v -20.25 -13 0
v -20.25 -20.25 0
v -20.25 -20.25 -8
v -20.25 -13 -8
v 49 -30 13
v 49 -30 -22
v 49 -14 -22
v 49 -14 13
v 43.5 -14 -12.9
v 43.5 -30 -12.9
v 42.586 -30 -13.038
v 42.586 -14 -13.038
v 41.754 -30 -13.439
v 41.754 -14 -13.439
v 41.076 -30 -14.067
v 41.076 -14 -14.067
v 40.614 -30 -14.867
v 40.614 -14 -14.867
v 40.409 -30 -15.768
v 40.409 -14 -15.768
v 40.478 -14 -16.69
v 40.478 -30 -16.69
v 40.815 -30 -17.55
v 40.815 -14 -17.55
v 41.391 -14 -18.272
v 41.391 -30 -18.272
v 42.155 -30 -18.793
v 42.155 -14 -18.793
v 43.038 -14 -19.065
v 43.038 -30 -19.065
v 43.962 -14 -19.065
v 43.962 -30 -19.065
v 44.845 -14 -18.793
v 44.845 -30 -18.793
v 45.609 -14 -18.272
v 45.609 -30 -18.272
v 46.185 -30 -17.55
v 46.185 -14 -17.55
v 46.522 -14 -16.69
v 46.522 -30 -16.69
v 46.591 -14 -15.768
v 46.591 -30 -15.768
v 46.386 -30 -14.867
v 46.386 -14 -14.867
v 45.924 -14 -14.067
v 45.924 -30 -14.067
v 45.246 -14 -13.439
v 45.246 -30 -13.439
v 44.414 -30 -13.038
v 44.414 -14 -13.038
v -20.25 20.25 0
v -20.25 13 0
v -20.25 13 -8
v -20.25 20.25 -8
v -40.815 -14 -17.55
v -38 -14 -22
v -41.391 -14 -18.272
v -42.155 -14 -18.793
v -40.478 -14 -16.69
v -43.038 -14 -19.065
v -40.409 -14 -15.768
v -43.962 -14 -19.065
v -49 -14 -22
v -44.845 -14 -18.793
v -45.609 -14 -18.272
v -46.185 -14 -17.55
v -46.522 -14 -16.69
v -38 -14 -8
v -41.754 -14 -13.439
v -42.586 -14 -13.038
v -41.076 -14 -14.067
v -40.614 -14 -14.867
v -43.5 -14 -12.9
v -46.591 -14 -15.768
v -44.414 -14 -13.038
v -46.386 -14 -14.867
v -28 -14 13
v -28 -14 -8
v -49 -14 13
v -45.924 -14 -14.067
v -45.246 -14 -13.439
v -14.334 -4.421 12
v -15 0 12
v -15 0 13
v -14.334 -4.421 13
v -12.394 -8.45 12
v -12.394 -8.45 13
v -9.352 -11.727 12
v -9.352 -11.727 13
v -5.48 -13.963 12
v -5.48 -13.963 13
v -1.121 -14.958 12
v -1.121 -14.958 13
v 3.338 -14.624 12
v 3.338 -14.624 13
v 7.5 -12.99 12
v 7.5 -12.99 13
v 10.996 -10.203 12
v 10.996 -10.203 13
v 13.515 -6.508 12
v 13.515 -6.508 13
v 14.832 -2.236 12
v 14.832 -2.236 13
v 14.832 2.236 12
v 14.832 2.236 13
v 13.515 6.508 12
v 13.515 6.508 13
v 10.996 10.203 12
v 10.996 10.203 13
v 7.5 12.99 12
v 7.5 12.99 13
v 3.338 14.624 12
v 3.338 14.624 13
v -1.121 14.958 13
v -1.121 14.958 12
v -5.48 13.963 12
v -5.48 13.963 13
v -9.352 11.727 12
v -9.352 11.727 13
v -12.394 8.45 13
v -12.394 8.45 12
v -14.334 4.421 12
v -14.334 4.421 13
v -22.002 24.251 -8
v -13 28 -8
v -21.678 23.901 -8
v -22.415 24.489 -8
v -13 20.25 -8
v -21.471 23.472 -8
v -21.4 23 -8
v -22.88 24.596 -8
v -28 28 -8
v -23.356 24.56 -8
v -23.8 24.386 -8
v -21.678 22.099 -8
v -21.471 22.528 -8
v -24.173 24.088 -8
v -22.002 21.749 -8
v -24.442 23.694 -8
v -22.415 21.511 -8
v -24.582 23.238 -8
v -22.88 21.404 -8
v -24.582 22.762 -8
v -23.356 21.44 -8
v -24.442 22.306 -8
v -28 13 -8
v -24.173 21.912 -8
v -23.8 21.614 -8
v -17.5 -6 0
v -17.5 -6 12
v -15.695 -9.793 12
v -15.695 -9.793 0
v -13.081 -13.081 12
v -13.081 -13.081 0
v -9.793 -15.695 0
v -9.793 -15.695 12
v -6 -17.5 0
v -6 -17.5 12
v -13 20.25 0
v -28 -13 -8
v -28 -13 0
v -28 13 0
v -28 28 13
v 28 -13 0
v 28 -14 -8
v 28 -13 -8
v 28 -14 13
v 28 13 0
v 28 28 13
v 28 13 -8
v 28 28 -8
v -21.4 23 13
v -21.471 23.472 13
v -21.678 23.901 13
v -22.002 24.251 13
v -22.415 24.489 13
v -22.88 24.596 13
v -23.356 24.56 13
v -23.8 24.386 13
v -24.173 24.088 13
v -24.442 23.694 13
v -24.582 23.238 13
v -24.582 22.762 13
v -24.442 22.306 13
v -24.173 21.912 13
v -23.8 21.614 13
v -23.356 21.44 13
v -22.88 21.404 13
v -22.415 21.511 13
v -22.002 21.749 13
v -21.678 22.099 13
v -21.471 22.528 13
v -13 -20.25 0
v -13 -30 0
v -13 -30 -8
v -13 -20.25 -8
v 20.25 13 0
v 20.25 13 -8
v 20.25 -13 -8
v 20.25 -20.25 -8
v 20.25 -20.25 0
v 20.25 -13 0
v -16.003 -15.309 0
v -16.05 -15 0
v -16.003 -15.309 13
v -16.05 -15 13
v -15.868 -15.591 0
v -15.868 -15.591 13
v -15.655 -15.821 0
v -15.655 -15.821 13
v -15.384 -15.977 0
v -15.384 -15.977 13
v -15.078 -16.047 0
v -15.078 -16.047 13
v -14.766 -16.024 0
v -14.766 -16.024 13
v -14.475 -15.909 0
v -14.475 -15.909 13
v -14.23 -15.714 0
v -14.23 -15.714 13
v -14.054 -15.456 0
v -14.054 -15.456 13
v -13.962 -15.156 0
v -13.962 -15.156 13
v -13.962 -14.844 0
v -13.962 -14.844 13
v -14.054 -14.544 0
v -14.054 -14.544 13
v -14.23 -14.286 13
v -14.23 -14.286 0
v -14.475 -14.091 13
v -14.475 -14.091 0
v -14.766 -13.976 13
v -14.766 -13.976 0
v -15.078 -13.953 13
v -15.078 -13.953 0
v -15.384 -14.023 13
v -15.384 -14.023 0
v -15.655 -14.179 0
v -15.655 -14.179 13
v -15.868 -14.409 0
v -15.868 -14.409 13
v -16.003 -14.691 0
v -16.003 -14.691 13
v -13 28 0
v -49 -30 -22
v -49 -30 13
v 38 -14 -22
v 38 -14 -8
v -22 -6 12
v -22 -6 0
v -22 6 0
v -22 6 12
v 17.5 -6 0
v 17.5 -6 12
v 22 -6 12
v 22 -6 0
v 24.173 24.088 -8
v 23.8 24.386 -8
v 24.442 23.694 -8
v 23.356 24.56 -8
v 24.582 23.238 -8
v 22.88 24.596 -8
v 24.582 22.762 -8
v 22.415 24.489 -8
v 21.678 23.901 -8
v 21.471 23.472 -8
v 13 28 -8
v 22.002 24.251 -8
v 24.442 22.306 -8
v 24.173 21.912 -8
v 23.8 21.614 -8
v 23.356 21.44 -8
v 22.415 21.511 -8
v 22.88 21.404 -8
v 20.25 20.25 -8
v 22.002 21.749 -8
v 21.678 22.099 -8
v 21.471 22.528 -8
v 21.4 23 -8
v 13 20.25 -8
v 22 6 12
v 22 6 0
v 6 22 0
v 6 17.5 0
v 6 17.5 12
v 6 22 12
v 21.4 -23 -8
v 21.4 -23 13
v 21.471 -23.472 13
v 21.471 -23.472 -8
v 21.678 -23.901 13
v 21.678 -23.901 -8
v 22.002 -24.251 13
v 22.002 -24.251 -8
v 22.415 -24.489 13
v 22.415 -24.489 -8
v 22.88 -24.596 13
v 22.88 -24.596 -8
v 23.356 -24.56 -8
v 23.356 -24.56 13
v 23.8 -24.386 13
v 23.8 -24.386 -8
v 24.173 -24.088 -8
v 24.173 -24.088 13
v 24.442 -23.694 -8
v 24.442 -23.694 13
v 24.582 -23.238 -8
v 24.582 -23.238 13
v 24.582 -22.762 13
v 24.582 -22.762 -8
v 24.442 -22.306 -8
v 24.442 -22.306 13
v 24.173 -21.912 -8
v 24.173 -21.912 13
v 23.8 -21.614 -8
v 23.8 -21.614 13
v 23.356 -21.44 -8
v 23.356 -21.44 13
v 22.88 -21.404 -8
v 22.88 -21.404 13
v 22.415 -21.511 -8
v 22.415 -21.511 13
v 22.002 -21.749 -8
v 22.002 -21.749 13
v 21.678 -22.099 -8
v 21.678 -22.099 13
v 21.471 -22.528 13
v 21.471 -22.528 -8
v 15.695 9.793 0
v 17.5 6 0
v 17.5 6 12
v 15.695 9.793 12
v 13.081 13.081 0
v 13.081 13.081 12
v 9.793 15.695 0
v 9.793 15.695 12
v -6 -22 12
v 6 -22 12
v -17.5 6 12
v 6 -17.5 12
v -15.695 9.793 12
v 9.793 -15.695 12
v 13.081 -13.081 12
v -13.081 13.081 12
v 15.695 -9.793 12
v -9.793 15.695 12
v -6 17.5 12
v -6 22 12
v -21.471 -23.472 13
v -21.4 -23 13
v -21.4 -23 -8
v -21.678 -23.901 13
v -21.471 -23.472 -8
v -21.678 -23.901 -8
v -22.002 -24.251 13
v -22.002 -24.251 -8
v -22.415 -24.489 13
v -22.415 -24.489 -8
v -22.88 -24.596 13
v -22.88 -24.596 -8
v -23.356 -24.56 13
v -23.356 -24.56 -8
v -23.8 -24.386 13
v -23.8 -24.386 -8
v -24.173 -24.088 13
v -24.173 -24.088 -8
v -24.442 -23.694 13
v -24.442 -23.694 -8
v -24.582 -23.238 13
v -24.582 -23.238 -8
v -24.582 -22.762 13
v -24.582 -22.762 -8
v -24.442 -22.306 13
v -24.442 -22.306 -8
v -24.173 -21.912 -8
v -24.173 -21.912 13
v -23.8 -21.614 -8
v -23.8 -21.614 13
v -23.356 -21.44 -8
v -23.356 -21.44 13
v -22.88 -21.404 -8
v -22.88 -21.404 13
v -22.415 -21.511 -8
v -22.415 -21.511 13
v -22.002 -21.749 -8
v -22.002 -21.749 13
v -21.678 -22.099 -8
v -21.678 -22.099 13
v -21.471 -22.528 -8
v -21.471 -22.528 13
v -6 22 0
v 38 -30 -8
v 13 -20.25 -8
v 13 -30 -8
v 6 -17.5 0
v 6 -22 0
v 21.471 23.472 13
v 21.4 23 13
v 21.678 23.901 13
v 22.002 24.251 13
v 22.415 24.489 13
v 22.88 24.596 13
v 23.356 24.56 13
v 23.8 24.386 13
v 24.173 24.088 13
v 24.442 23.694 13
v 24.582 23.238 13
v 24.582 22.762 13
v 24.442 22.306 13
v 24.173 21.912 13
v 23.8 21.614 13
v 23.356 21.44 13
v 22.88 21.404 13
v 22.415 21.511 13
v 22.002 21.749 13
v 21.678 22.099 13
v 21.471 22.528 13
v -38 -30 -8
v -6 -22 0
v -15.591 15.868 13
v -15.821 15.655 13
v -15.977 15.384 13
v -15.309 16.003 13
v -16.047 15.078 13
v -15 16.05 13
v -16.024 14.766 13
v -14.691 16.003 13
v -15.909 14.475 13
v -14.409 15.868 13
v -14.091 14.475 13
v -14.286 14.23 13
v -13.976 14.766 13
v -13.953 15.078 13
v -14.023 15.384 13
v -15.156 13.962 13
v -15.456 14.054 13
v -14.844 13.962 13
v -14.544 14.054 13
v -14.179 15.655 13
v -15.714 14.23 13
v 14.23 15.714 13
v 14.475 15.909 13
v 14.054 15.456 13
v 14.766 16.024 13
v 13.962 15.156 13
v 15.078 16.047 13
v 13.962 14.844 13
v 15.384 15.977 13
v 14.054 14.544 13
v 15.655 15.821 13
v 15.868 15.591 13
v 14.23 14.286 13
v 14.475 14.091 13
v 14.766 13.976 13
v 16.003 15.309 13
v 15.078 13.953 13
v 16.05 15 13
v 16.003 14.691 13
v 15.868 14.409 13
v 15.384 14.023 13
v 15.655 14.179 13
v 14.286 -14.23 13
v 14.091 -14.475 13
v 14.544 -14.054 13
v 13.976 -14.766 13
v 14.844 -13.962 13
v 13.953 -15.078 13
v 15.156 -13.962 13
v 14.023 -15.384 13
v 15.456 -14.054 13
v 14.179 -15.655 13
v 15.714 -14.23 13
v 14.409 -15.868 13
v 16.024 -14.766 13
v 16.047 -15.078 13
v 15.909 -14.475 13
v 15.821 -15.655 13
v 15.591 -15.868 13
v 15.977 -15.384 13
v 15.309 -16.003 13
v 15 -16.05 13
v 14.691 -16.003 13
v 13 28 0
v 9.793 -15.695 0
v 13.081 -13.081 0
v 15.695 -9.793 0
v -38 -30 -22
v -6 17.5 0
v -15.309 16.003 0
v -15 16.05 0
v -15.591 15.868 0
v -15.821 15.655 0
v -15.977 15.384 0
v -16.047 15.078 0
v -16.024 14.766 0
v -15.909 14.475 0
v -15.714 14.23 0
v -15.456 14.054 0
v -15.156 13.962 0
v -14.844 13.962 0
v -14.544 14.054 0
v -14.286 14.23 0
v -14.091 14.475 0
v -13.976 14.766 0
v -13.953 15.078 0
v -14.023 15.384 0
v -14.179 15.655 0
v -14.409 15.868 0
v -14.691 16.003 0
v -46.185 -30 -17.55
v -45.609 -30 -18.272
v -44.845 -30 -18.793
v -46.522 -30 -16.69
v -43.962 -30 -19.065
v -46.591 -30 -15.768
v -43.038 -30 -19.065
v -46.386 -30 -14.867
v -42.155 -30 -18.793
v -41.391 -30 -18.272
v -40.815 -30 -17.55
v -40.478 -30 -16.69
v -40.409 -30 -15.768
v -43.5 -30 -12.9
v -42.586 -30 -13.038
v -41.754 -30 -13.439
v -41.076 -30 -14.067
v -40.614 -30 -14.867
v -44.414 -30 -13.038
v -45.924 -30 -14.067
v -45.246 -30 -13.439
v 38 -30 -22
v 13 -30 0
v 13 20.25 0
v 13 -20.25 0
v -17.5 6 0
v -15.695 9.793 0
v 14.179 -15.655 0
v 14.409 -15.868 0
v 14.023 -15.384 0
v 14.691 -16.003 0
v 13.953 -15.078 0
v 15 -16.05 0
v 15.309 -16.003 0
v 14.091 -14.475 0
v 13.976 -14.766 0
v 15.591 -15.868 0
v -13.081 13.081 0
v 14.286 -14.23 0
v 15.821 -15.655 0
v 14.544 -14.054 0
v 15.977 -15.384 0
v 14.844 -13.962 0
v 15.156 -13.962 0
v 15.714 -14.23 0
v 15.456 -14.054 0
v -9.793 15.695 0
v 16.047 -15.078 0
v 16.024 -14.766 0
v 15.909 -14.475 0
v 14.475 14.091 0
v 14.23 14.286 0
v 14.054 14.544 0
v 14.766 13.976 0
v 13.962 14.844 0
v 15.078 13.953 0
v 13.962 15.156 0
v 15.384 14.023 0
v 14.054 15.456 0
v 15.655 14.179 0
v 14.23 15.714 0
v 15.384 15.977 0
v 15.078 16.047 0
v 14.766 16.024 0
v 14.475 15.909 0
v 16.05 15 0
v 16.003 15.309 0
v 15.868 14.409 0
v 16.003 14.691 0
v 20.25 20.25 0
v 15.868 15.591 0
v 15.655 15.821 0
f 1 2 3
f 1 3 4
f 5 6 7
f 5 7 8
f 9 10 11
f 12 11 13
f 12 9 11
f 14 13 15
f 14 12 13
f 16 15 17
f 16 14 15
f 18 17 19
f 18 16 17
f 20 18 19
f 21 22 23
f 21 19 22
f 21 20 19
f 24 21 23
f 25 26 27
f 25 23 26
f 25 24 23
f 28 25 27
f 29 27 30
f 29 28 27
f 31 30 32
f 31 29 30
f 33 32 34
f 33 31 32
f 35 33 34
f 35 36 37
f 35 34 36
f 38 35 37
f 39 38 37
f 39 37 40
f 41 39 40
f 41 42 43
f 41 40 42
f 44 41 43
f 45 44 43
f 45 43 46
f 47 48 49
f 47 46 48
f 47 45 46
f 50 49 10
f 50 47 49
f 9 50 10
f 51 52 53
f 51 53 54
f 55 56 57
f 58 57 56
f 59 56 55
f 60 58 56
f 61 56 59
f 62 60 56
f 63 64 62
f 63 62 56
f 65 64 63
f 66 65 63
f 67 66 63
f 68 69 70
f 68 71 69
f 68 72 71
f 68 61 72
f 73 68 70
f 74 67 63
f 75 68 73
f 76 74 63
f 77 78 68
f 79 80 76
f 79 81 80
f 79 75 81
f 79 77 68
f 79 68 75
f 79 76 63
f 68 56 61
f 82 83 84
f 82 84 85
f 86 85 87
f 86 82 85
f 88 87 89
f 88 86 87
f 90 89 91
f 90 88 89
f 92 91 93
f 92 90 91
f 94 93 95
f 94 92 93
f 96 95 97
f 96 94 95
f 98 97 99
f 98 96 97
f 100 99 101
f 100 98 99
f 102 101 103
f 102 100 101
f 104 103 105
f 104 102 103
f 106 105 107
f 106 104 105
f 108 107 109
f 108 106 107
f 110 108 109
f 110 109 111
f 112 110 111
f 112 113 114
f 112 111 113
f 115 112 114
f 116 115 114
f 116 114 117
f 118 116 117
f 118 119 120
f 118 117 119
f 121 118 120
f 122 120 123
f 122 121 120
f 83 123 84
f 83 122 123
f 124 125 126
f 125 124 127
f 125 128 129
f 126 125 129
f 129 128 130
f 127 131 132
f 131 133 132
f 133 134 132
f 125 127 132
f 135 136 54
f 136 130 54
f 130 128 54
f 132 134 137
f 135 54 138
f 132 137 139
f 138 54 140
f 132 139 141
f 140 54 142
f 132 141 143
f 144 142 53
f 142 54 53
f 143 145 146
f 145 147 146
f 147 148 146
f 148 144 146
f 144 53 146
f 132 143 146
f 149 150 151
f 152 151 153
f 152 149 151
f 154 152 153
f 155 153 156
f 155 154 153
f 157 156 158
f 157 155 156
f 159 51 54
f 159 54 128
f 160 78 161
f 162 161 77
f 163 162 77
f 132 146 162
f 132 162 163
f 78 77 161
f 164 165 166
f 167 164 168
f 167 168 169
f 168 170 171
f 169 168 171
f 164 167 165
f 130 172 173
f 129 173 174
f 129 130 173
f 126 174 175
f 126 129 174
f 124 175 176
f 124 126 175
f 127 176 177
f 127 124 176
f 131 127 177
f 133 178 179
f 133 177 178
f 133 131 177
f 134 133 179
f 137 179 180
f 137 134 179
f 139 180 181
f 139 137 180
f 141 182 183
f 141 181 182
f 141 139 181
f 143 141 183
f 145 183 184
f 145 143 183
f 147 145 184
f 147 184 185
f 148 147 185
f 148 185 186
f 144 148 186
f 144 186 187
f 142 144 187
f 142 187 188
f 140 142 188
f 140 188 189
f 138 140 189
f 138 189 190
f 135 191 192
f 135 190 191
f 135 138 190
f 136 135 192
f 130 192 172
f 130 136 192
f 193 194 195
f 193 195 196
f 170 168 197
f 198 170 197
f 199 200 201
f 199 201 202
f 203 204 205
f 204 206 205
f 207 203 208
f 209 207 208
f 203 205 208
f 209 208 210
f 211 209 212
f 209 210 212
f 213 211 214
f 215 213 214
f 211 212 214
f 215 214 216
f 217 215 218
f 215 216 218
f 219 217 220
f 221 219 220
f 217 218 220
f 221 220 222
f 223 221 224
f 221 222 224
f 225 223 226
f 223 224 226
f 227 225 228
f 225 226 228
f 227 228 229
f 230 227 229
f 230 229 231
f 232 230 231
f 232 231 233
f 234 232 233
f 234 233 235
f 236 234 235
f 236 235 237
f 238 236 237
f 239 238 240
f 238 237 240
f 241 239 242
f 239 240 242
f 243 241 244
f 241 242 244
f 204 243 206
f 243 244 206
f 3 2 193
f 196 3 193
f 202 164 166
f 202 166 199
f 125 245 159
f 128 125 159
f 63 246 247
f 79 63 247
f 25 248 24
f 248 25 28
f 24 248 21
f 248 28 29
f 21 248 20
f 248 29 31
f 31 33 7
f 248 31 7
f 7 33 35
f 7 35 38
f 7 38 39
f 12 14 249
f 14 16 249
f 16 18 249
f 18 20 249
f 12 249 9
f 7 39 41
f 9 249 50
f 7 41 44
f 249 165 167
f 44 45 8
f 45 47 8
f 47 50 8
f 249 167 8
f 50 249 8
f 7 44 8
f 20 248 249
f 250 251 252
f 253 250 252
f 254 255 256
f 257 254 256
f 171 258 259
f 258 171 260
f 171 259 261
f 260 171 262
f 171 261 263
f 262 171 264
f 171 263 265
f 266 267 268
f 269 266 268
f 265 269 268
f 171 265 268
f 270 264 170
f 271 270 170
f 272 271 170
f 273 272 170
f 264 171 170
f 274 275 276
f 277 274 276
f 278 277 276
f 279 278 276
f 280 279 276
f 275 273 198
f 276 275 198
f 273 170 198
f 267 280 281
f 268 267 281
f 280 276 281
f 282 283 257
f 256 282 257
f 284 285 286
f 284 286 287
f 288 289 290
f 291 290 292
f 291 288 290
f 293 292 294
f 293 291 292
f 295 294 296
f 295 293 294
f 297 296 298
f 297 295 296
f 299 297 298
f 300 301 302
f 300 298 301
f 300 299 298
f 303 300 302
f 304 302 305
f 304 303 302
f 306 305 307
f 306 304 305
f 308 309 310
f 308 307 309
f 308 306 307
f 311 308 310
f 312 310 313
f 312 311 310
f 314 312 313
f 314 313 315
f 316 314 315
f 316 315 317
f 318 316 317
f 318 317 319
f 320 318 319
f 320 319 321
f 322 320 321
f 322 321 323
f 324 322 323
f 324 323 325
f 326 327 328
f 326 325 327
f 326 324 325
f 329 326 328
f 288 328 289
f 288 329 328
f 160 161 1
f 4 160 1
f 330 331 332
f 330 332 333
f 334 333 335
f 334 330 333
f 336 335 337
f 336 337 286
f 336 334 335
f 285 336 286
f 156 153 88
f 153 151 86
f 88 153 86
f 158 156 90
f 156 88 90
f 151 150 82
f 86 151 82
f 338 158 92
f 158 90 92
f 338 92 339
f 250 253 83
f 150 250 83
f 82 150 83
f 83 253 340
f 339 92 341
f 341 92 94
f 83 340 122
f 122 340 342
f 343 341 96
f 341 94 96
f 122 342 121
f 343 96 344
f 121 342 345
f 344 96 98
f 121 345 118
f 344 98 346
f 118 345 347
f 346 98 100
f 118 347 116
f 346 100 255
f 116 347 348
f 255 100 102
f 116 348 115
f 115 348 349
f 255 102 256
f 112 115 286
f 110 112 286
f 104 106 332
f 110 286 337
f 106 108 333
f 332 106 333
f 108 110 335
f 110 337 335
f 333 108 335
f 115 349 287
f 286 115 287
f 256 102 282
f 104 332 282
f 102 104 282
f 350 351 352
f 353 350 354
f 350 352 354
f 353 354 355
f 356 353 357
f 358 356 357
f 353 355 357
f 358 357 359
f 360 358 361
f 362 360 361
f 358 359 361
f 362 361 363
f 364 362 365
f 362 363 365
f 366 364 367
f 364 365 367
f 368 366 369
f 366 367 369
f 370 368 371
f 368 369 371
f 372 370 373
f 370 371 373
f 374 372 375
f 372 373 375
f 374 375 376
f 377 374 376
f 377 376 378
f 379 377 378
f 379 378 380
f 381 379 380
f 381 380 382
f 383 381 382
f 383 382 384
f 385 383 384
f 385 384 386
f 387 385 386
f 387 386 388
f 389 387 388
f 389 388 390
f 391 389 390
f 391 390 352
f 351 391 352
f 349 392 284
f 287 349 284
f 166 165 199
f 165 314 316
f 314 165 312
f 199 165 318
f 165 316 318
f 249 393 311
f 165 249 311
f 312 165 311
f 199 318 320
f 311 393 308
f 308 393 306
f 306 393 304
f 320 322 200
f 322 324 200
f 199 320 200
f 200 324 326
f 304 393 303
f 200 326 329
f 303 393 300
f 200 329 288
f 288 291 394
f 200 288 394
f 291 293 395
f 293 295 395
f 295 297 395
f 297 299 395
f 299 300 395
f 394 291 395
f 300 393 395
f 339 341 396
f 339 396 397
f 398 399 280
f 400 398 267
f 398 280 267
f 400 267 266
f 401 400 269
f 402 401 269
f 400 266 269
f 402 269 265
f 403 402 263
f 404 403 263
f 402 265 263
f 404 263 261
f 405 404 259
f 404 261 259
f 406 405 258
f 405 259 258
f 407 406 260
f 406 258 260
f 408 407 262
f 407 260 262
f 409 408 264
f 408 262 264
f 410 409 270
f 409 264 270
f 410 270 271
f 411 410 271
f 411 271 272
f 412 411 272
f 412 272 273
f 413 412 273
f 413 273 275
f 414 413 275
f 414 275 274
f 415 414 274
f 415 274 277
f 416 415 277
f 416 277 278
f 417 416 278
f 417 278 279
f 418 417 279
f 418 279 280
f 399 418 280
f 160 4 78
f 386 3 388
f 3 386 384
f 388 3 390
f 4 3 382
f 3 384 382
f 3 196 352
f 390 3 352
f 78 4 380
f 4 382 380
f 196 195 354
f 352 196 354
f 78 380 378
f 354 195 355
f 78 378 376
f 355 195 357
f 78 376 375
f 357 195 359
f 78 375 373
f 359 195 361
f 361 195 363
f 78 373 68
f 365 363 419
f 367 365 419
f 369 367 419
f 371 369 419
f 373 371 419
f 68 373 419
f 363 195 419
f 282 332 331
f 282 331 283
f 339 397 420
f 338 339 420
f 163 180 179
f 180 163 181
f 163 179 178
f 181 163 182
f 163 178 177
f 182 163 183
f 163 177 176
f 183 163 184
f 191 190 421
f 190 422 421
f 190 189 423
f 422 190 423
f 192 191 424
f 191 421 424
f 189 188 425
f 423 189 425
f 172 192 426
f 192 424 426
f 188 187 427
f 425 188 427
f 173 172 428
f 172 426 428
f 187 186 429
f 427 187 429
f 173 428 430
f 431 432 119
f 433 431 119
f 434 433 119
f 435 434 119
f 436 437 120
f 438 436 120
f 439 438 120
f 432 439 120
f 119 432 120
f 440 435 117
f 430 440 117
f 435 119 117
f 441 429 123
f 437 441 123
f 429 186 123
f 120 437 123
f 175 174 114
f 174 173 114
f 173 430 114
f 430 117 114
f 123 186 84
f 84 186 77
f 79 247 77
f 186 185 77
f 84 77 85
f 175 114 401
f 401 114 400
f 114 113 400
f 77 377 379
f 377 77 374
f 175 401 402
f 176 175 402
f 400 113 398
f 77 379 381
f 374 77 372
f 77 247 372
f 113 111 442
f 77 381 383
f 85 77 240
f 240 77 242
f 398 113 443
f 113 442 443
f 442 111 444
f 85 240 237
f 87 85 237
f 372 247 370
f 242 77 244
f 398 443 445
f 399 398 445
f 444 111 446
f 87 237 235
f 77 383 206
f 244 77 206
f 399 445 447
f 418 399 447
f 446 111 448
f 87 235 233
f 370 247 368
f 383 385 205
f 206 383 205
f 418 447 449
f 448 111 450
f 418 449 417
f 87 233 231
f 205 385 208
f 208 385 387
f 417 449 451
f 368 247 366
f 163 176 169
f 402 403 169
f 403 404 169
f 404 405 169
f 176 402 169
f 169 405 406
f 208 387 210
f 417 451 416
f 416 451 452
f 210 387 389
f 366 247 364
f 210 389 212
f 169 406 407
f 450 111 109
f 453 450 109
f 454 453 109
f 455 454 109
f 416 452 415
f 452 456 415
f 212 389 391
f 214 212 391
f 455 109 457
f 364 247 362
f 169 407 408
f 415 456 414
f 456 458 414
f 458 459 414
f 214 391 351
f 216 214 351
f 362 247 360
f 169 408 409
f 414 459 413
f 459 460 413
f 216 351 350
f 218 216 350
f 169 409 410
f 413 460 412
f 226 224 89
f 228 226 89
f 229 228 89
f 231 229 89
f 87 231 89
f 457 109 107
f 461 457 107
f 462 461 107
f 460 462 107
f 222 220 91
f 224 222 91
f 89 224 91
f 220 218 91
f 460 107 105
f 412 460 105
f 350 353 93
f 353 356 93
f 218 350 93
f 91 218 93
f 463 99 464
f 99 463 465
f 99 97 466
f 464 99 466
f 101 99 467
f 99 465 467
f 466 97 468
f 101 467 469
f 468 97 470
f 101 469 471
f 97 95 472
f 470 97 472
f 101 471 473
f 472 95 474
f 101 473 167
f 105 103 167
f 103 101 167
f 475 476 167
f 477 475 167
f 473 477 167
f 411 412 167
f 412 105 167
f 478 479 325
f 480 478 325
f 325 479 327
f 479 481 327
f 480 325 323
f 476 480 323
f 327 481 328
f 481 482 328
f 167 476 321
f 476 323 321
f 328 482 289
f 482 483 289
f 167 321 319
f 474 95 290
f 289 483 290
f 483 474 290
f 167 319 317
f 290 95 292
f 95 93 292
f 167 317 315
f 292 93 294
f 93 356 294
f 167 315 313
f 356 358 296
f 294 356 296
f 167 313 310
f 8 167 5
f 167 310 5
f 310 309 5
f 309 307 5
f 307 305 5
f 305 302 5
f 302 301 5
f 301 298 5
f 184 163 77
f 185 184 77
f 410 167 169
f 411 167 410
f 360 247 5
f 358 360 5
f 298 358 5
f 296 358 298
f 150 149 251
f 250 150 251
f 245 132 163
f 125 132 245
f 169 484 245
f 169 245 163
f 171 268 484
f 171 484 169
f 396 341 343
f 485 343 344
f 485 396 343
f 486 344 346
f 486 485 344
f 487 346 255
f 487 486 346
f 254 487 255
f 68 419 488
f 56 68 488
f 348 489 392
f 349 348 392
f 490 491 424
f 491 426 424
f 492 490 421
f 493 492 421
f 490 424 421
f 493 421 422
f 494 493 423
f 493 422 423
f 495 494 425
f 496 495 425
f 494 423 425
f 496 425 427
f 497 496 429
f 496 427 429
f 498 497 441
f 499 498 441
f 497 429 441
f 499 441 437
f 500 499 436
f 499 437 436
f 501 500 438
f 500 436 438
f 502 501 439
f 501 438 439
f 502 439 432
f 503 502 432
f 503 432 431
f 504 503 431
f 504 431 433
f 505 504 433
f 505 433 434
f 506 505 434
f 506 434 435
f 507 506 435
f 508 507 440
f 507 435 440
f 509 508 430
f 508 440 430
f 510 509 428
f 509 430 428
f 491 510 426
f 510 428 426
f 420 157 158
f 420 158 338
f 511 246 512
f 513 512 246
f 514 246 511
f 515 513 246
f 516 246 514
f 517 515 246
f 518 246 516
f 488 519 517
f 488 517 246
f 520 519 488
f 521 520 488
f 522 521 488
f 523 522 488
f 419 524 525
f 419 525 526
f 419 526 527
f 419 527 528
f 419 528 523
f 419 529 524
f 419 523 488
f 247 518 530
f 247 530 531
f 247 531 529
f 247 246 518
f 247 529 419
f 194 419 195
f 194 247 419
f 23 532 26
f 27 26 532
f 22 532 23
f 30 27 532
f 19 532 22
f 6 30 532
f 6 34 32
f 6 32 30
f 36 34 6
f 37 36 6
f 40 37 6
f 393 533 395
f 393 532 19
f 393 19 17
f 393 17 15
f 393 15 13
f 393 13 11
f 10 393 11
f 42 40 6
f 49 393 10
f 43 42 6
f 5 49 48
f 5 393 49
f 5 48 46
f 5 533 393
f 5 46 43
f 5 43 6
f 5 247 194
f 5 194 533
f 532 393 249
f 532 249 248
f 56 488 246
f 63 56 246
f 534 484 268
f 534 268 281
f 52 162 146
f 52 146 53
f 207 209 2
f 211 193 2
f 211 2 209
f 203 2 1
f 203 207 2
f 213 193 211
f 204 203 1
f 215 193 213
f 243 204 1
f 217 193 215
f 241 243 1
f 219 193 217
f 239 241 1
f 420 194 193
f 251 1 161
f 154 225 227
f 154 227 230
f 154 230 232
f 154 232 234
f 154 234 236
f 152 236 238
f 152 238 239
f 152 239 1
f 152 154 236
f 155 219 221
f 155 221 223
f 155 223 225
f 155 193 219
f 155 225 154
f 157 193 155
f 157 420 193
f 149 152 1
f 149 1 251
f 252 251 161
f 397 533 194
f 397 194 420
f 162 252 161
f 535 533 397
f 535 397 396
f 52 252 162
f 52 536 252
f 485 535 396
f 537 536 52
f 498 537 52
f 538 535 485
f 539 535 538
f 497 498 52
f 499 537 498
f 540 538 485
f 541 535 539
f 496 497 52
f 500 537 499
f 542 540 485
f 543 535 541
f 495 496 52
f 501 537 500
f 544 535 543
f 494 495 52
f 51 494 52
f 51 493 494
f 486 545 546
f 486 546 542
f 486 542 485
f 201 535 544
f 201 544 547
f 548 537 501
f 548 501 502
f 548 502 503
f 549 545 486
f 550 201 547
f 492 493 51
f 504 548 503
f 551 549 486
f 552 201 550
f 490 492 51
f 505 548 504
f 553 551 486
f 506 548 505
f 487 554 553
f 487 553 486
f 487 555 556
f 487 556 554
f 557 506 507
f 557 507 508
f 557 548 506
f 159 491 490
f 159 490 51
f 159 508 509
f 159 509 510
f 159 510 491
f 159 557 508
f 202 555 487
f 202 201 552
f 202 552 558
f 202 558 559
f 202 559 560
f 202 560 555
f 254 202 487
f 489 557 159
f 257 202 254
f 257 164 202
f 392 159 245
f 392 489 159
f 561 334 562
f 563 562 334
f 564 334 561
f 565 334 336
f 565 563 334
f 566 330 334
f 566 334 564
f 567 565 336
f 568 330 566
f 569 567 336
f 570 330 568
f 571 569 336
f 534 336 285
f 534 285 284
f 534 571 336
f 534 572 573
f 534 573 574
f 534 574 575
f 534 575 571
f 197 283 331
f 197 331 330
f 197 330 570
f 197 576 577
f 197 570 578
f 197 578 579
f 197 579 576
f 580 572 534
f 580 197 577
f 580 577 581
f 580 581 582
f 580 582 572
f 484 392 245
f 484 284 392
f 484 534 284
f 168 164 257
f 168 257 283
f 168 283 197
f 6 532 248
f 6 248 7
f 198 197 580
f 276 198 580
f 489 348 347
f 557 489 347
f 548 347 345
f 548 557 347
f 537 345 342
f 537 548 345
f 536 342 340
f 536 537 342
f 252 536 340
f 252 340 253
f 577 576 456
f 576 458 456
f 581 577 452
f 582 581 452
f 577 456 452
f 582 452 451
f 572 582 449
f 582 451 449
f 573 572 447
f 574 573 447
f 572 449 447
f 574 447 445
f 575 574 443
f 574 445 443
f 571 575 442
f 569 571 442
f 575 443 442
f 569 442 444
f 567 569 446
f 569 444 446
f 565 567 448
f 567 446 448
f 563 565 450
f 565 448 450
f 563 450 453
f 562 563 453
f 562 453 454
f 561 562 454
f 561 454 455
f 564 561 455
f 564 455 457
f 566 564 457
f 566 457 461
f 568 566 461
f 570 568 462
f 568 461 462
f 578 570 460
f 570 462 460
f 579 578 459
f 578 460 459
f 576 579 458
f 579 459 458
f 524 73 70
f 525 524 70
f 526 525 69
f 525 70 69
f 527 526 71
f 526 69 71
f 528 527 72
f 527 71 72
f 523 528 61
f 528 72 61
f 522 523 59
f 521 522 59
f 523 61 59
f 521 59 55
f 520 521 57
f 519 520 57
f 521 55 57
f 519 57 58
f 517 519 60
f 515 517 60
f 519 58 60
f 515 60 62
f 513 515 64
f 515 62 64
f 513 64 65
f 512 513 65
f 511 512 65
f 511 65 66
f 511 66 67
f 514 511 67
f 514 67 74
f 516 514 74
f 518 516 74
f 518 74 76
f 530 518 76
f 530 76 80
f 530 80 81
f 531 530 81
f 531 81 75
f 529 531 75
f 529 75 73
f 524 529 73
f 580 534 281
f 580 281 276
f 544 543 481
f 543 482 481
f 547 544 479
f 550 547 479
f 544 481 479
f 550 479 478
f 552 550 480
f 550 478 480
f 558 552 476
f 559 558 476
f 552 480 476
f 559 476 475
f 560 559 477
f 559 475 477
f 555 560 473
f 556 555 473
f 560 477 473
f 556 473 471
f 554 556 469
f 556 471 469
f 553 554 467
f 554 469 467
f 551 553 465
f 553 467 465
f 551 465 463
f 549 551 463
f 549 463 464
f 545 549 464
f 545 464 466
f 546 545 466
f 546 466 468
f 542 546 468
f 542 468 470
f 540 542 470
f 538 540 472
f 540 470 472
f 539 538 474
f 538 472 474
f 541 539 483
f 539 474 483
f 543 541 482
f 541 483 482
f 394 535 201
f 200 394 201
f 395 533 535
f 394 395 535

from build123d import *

# Parameters (mm, degrees)
BOSS_EXTRUDE1_DEPTH      = 13
BOSS_EXTRUDE1_DEPTH_BACK = 8
SKETCH2_W                = 56
SKETCH2_H                = 56
CUT_EXTRUDE1_DEPTH       = 12
CUT_EXTRUDE1_DEPTH_BACK  = 42.677331968
SKETCH1_R                = 18.5
SKETCH4_R                = 15
CUT_EXTRUDE2_DEPTH       = 42.677331968
CUT_EXTRUDE3_START       = -42.677331968
SKETCH5_W                = 12
SKETCH5_H                = 8
CUT_EXTRUDE3_DEPTH       = 54.677331968
SKETCH6_W                = 40.5
SKETCH6_H                = 40.5
CUT_EXTRUDE4_DEPTH       = 42.677331968
SKETCH3_R                = 1.05
CUT_EXTRUDE5_DEPTH       = 42.677331968
CIRPATTERN1_COUNT        = 4
SKETCH7_W                = 98
SKETCH7_H                = 21
BOSS_EXTRUDE2_DEPTH      = 2
BOSS_EXTRUDE3_DEPTH      = 16
SKETCH9_R                = 3.1
CUT_EXTRUDE6_DEPTH       = 69.183575735
SKETCH10_W               = 26
SKETCH10_H               = 9.75
CUT_EXTRUDE7_DEPTH       = 62.522353661
SKETCH11_R               = 1.6
CUT_EXTRUDE8_DEPTH       = 62.171888969
MIRROR4_COPY_1_SKETCH_R  = 1.6
MIRROR4_COPY_1_DEPTH     = 62.171888969
CIRPATTERN2_COUNT        = 4
CIRPATTERN3_COUNT        = 4


with BuildPart() as part:
    # Sketch2 → Boss-Extrude1 (new, two sides: drawn at the far end of the back side and taken through both)
    with BuildSketch(Plane.XY.offset(-BOSS_EXTRUDE1_DEPTH_BACK)):
        Rectangle(SKETCH2_W, SKETCH2_H)
    extrude(amount=BOSS_EXTRUDE1_DEPTH + BOSS_EXTRUDE1_DEPTH_BACK)

    # Sketch1 → Cut-Extrude1 (cut, two sides: drawn at the far end of the back side and taken through both)
    with BuildSketch(Plane.XY.offset(-CUT_EXTRUDE1_DEPTH_BACK)):
        Circle(SKETCH1_R)
    extrude(amount=CUT_EXTRUDE1_DEPTH + CUT_EXTRUDE1_DEPTH_BACK, mode=Mode.SUBTRACT)

    # Sketch4 → Cut-Extrude2 (cut, through all)
    with BuildSketch(Plane.XY):
        with Locations(Location((0, 0, 0), (0, 0, 180))):
            Circle(SKETCH4_R)
    extrude(amount=CUT_EXTRUDE2_DEPTH, mode=Mode.SUBTRACT)

    # Sketch5 → Cut-Extrude3 (cut)
    with BuildSketch(Plane.XY.offset(CUT_EXTRUDE3_START)):
        with Locations((0, 18)):
            Rectangle(SKETCH5_W, SKETCH5_H)
    cut_extrude3 = extrude(amount=CUT_EXTRUDE3_DEPTH, mode=Mode.SUBTRACT)

    # Sketch6 → Cut-Extrude4 (cut, through all)
    with BuildSketch(Plane.XY):
        Rectangle(SKETCH6_W, SKETCH6_H)
    extrude(amount=-CUT_EXTRUDE4_DEPTH, mode=Mode.SUBTRACT)

    # Sketch3 → Cut-Extrude5 (cut, symmetric)
    with BuildSketch(Plane.XY):
        with Locations((15, 15)):
            Circle(SKETCH3_R)
    cut_extrude5 = extrude(amount=CUT_EXTRUDE5_DEPTH, both=True, mode=Mode.SUBTRACT)

    # CirPattern1: Cut-Extrude5 ×4 about axis
    cirpattern1_axis = Axis((0, 0, 0), (0, 0, 1))
    for i in range(1, CIRPATTERN1_COUNT):
        add(cut_extrude5.rotate(cirpattern1_axis, i * 360 / CIRPATTERN1_COUNT), mode=Mode.SUBTRACT)

    # Sketch7 → Boss-Extrude2 (add)
    with BuildSketch(Plane.XZ.offset(28)):
        with Locations((0, 2.5)):
            Rectangle(SKETCH7_W, SKETCH7_H)
    extrude(amount=BOSS_EXTRUDE2_DEPTH)

    # Sketch8 → Boss-Extrude3 (add)
    with BuildSketch(Plane.XZ.offset(30)):
        Polygon((49, 13), (39, 13), (28, 13), (28, -8), (38, -8), (38, -22), (49, -22), align=None)
    boss_extrude3 = extrude(amount=-BOSS_EXTRUDE3_DEPTH)

    # Mirror1: Boss-Extrude3 across plane
    add(boss_extrude3.mirror(Plane(origin=(0, 0, 0), x_dir=(0, 0, 1), z_dir=(1, 0, 0))))

    # Sketch9 → Cut-Extrude6 (cut, through all)
    with BuildSketch(Plane(origin=(0, -14, 0), x_dir=(1, 0, 0), z_dir=(0, 1, 0))):
        with Locations(Location((-43.5, 16, 0), (0, 0, 270))):
            Circle(SKETCH9_R)
    cut_extrude6 = extrude(amount=-CUT_EXTRUDE6_DEPTH, mode=Mode.SUBTRACT)

    # Mirror2: Cut-Extrude6 across plane
    add(cut_extrude6.mirror(Plane(origin=(0, 0, 0), x_dir=(0, 0, 1), z_dir=(1, 0, 0))), mode=Mode.SUBTRACT)

    # Sketch10 → Cut-Extrude7 (cut, through all)
    with BuildSketch(Plane(origin=(0, 0, 0), x_dir=(-1, 0, 0), z_dir=(0, 0, -1))):
        with Locations((0, -25.125)):
            Rectangle(SKETCH10_W, SKETCH10_H)
    cut_extrude7 = extrude(amount=CUT_EXTRUDE7_DEPTH, mode=Mode.SUBTRACT)

    # Sketch11 → Cut-Extrude8 (cut, through all)
    with BuildSketch(Plane(origin=(0, 0, -8), x_dir=(-1, 0, 0), z_dir=(0, 0, -1))):
        with Locations((-23, 23)):
            Circle(SKETCH11_R)
    cut_extrude8 = extrude(amount=-CUT_EXTRUDE8_DEPTH, mode=Mode.SUBTRACT)

    # Mirror3: Cut-Extrude8 across plane
    add(cut_extrude8.mirror(Plane.ZX), mode=Mode.SUBTRACT)

    # Mirror4: Cut-Extrude8 across plane
    add(cut_extrude8.mirror(Plane(origin=(0, 0, 0), x_dir=(0, 0, 1), z_dir=(1, 0, 0))), mode=Mode.SUBTRACT)

    # Mirror4 copy 1 sketch → Mirror4 copy 1 (cut, through all)
    with BuildSketch(Plane(origin=(0, 0, -8), x_dir=(1, 0, 0), z_dir=(0, 0, -1))):
        with Locations((-23, 23)):
            Circle(MIRROR4_COPY_1_SKETCH_R)
    extrude(amount=-MIRROR4_COPY_1_DEPTH, mode=Mode.SUBTRACT)

    # CirPattern2: Cut-Extrude3 ×4 about axis
    cirpattern2_axis = Axis((0, 0, 0), (0, 0, 1))
    for i in range(1, CIRPATTERN2_COUNT):
        add(cut_extrude3.rotate(cirpattern2_axis, i * 360 / CIRPATTERN2_COUNT), mode=Mode.SUBTRACT)

    # CirPattern3: Cut-Extrude7 ×4 about axis
    cirpattern3_axis = Axis((0, 0, 0), (0, 0, 1))
    for i in range(1, CIRPATTERN3_COUNT):
        add(cut_extrude7.rotate(cirpattern3_axis, i * 360 / CIRPATTERN3_COUNT), mode=Mode.SUBTRACT)


solid = part.part
